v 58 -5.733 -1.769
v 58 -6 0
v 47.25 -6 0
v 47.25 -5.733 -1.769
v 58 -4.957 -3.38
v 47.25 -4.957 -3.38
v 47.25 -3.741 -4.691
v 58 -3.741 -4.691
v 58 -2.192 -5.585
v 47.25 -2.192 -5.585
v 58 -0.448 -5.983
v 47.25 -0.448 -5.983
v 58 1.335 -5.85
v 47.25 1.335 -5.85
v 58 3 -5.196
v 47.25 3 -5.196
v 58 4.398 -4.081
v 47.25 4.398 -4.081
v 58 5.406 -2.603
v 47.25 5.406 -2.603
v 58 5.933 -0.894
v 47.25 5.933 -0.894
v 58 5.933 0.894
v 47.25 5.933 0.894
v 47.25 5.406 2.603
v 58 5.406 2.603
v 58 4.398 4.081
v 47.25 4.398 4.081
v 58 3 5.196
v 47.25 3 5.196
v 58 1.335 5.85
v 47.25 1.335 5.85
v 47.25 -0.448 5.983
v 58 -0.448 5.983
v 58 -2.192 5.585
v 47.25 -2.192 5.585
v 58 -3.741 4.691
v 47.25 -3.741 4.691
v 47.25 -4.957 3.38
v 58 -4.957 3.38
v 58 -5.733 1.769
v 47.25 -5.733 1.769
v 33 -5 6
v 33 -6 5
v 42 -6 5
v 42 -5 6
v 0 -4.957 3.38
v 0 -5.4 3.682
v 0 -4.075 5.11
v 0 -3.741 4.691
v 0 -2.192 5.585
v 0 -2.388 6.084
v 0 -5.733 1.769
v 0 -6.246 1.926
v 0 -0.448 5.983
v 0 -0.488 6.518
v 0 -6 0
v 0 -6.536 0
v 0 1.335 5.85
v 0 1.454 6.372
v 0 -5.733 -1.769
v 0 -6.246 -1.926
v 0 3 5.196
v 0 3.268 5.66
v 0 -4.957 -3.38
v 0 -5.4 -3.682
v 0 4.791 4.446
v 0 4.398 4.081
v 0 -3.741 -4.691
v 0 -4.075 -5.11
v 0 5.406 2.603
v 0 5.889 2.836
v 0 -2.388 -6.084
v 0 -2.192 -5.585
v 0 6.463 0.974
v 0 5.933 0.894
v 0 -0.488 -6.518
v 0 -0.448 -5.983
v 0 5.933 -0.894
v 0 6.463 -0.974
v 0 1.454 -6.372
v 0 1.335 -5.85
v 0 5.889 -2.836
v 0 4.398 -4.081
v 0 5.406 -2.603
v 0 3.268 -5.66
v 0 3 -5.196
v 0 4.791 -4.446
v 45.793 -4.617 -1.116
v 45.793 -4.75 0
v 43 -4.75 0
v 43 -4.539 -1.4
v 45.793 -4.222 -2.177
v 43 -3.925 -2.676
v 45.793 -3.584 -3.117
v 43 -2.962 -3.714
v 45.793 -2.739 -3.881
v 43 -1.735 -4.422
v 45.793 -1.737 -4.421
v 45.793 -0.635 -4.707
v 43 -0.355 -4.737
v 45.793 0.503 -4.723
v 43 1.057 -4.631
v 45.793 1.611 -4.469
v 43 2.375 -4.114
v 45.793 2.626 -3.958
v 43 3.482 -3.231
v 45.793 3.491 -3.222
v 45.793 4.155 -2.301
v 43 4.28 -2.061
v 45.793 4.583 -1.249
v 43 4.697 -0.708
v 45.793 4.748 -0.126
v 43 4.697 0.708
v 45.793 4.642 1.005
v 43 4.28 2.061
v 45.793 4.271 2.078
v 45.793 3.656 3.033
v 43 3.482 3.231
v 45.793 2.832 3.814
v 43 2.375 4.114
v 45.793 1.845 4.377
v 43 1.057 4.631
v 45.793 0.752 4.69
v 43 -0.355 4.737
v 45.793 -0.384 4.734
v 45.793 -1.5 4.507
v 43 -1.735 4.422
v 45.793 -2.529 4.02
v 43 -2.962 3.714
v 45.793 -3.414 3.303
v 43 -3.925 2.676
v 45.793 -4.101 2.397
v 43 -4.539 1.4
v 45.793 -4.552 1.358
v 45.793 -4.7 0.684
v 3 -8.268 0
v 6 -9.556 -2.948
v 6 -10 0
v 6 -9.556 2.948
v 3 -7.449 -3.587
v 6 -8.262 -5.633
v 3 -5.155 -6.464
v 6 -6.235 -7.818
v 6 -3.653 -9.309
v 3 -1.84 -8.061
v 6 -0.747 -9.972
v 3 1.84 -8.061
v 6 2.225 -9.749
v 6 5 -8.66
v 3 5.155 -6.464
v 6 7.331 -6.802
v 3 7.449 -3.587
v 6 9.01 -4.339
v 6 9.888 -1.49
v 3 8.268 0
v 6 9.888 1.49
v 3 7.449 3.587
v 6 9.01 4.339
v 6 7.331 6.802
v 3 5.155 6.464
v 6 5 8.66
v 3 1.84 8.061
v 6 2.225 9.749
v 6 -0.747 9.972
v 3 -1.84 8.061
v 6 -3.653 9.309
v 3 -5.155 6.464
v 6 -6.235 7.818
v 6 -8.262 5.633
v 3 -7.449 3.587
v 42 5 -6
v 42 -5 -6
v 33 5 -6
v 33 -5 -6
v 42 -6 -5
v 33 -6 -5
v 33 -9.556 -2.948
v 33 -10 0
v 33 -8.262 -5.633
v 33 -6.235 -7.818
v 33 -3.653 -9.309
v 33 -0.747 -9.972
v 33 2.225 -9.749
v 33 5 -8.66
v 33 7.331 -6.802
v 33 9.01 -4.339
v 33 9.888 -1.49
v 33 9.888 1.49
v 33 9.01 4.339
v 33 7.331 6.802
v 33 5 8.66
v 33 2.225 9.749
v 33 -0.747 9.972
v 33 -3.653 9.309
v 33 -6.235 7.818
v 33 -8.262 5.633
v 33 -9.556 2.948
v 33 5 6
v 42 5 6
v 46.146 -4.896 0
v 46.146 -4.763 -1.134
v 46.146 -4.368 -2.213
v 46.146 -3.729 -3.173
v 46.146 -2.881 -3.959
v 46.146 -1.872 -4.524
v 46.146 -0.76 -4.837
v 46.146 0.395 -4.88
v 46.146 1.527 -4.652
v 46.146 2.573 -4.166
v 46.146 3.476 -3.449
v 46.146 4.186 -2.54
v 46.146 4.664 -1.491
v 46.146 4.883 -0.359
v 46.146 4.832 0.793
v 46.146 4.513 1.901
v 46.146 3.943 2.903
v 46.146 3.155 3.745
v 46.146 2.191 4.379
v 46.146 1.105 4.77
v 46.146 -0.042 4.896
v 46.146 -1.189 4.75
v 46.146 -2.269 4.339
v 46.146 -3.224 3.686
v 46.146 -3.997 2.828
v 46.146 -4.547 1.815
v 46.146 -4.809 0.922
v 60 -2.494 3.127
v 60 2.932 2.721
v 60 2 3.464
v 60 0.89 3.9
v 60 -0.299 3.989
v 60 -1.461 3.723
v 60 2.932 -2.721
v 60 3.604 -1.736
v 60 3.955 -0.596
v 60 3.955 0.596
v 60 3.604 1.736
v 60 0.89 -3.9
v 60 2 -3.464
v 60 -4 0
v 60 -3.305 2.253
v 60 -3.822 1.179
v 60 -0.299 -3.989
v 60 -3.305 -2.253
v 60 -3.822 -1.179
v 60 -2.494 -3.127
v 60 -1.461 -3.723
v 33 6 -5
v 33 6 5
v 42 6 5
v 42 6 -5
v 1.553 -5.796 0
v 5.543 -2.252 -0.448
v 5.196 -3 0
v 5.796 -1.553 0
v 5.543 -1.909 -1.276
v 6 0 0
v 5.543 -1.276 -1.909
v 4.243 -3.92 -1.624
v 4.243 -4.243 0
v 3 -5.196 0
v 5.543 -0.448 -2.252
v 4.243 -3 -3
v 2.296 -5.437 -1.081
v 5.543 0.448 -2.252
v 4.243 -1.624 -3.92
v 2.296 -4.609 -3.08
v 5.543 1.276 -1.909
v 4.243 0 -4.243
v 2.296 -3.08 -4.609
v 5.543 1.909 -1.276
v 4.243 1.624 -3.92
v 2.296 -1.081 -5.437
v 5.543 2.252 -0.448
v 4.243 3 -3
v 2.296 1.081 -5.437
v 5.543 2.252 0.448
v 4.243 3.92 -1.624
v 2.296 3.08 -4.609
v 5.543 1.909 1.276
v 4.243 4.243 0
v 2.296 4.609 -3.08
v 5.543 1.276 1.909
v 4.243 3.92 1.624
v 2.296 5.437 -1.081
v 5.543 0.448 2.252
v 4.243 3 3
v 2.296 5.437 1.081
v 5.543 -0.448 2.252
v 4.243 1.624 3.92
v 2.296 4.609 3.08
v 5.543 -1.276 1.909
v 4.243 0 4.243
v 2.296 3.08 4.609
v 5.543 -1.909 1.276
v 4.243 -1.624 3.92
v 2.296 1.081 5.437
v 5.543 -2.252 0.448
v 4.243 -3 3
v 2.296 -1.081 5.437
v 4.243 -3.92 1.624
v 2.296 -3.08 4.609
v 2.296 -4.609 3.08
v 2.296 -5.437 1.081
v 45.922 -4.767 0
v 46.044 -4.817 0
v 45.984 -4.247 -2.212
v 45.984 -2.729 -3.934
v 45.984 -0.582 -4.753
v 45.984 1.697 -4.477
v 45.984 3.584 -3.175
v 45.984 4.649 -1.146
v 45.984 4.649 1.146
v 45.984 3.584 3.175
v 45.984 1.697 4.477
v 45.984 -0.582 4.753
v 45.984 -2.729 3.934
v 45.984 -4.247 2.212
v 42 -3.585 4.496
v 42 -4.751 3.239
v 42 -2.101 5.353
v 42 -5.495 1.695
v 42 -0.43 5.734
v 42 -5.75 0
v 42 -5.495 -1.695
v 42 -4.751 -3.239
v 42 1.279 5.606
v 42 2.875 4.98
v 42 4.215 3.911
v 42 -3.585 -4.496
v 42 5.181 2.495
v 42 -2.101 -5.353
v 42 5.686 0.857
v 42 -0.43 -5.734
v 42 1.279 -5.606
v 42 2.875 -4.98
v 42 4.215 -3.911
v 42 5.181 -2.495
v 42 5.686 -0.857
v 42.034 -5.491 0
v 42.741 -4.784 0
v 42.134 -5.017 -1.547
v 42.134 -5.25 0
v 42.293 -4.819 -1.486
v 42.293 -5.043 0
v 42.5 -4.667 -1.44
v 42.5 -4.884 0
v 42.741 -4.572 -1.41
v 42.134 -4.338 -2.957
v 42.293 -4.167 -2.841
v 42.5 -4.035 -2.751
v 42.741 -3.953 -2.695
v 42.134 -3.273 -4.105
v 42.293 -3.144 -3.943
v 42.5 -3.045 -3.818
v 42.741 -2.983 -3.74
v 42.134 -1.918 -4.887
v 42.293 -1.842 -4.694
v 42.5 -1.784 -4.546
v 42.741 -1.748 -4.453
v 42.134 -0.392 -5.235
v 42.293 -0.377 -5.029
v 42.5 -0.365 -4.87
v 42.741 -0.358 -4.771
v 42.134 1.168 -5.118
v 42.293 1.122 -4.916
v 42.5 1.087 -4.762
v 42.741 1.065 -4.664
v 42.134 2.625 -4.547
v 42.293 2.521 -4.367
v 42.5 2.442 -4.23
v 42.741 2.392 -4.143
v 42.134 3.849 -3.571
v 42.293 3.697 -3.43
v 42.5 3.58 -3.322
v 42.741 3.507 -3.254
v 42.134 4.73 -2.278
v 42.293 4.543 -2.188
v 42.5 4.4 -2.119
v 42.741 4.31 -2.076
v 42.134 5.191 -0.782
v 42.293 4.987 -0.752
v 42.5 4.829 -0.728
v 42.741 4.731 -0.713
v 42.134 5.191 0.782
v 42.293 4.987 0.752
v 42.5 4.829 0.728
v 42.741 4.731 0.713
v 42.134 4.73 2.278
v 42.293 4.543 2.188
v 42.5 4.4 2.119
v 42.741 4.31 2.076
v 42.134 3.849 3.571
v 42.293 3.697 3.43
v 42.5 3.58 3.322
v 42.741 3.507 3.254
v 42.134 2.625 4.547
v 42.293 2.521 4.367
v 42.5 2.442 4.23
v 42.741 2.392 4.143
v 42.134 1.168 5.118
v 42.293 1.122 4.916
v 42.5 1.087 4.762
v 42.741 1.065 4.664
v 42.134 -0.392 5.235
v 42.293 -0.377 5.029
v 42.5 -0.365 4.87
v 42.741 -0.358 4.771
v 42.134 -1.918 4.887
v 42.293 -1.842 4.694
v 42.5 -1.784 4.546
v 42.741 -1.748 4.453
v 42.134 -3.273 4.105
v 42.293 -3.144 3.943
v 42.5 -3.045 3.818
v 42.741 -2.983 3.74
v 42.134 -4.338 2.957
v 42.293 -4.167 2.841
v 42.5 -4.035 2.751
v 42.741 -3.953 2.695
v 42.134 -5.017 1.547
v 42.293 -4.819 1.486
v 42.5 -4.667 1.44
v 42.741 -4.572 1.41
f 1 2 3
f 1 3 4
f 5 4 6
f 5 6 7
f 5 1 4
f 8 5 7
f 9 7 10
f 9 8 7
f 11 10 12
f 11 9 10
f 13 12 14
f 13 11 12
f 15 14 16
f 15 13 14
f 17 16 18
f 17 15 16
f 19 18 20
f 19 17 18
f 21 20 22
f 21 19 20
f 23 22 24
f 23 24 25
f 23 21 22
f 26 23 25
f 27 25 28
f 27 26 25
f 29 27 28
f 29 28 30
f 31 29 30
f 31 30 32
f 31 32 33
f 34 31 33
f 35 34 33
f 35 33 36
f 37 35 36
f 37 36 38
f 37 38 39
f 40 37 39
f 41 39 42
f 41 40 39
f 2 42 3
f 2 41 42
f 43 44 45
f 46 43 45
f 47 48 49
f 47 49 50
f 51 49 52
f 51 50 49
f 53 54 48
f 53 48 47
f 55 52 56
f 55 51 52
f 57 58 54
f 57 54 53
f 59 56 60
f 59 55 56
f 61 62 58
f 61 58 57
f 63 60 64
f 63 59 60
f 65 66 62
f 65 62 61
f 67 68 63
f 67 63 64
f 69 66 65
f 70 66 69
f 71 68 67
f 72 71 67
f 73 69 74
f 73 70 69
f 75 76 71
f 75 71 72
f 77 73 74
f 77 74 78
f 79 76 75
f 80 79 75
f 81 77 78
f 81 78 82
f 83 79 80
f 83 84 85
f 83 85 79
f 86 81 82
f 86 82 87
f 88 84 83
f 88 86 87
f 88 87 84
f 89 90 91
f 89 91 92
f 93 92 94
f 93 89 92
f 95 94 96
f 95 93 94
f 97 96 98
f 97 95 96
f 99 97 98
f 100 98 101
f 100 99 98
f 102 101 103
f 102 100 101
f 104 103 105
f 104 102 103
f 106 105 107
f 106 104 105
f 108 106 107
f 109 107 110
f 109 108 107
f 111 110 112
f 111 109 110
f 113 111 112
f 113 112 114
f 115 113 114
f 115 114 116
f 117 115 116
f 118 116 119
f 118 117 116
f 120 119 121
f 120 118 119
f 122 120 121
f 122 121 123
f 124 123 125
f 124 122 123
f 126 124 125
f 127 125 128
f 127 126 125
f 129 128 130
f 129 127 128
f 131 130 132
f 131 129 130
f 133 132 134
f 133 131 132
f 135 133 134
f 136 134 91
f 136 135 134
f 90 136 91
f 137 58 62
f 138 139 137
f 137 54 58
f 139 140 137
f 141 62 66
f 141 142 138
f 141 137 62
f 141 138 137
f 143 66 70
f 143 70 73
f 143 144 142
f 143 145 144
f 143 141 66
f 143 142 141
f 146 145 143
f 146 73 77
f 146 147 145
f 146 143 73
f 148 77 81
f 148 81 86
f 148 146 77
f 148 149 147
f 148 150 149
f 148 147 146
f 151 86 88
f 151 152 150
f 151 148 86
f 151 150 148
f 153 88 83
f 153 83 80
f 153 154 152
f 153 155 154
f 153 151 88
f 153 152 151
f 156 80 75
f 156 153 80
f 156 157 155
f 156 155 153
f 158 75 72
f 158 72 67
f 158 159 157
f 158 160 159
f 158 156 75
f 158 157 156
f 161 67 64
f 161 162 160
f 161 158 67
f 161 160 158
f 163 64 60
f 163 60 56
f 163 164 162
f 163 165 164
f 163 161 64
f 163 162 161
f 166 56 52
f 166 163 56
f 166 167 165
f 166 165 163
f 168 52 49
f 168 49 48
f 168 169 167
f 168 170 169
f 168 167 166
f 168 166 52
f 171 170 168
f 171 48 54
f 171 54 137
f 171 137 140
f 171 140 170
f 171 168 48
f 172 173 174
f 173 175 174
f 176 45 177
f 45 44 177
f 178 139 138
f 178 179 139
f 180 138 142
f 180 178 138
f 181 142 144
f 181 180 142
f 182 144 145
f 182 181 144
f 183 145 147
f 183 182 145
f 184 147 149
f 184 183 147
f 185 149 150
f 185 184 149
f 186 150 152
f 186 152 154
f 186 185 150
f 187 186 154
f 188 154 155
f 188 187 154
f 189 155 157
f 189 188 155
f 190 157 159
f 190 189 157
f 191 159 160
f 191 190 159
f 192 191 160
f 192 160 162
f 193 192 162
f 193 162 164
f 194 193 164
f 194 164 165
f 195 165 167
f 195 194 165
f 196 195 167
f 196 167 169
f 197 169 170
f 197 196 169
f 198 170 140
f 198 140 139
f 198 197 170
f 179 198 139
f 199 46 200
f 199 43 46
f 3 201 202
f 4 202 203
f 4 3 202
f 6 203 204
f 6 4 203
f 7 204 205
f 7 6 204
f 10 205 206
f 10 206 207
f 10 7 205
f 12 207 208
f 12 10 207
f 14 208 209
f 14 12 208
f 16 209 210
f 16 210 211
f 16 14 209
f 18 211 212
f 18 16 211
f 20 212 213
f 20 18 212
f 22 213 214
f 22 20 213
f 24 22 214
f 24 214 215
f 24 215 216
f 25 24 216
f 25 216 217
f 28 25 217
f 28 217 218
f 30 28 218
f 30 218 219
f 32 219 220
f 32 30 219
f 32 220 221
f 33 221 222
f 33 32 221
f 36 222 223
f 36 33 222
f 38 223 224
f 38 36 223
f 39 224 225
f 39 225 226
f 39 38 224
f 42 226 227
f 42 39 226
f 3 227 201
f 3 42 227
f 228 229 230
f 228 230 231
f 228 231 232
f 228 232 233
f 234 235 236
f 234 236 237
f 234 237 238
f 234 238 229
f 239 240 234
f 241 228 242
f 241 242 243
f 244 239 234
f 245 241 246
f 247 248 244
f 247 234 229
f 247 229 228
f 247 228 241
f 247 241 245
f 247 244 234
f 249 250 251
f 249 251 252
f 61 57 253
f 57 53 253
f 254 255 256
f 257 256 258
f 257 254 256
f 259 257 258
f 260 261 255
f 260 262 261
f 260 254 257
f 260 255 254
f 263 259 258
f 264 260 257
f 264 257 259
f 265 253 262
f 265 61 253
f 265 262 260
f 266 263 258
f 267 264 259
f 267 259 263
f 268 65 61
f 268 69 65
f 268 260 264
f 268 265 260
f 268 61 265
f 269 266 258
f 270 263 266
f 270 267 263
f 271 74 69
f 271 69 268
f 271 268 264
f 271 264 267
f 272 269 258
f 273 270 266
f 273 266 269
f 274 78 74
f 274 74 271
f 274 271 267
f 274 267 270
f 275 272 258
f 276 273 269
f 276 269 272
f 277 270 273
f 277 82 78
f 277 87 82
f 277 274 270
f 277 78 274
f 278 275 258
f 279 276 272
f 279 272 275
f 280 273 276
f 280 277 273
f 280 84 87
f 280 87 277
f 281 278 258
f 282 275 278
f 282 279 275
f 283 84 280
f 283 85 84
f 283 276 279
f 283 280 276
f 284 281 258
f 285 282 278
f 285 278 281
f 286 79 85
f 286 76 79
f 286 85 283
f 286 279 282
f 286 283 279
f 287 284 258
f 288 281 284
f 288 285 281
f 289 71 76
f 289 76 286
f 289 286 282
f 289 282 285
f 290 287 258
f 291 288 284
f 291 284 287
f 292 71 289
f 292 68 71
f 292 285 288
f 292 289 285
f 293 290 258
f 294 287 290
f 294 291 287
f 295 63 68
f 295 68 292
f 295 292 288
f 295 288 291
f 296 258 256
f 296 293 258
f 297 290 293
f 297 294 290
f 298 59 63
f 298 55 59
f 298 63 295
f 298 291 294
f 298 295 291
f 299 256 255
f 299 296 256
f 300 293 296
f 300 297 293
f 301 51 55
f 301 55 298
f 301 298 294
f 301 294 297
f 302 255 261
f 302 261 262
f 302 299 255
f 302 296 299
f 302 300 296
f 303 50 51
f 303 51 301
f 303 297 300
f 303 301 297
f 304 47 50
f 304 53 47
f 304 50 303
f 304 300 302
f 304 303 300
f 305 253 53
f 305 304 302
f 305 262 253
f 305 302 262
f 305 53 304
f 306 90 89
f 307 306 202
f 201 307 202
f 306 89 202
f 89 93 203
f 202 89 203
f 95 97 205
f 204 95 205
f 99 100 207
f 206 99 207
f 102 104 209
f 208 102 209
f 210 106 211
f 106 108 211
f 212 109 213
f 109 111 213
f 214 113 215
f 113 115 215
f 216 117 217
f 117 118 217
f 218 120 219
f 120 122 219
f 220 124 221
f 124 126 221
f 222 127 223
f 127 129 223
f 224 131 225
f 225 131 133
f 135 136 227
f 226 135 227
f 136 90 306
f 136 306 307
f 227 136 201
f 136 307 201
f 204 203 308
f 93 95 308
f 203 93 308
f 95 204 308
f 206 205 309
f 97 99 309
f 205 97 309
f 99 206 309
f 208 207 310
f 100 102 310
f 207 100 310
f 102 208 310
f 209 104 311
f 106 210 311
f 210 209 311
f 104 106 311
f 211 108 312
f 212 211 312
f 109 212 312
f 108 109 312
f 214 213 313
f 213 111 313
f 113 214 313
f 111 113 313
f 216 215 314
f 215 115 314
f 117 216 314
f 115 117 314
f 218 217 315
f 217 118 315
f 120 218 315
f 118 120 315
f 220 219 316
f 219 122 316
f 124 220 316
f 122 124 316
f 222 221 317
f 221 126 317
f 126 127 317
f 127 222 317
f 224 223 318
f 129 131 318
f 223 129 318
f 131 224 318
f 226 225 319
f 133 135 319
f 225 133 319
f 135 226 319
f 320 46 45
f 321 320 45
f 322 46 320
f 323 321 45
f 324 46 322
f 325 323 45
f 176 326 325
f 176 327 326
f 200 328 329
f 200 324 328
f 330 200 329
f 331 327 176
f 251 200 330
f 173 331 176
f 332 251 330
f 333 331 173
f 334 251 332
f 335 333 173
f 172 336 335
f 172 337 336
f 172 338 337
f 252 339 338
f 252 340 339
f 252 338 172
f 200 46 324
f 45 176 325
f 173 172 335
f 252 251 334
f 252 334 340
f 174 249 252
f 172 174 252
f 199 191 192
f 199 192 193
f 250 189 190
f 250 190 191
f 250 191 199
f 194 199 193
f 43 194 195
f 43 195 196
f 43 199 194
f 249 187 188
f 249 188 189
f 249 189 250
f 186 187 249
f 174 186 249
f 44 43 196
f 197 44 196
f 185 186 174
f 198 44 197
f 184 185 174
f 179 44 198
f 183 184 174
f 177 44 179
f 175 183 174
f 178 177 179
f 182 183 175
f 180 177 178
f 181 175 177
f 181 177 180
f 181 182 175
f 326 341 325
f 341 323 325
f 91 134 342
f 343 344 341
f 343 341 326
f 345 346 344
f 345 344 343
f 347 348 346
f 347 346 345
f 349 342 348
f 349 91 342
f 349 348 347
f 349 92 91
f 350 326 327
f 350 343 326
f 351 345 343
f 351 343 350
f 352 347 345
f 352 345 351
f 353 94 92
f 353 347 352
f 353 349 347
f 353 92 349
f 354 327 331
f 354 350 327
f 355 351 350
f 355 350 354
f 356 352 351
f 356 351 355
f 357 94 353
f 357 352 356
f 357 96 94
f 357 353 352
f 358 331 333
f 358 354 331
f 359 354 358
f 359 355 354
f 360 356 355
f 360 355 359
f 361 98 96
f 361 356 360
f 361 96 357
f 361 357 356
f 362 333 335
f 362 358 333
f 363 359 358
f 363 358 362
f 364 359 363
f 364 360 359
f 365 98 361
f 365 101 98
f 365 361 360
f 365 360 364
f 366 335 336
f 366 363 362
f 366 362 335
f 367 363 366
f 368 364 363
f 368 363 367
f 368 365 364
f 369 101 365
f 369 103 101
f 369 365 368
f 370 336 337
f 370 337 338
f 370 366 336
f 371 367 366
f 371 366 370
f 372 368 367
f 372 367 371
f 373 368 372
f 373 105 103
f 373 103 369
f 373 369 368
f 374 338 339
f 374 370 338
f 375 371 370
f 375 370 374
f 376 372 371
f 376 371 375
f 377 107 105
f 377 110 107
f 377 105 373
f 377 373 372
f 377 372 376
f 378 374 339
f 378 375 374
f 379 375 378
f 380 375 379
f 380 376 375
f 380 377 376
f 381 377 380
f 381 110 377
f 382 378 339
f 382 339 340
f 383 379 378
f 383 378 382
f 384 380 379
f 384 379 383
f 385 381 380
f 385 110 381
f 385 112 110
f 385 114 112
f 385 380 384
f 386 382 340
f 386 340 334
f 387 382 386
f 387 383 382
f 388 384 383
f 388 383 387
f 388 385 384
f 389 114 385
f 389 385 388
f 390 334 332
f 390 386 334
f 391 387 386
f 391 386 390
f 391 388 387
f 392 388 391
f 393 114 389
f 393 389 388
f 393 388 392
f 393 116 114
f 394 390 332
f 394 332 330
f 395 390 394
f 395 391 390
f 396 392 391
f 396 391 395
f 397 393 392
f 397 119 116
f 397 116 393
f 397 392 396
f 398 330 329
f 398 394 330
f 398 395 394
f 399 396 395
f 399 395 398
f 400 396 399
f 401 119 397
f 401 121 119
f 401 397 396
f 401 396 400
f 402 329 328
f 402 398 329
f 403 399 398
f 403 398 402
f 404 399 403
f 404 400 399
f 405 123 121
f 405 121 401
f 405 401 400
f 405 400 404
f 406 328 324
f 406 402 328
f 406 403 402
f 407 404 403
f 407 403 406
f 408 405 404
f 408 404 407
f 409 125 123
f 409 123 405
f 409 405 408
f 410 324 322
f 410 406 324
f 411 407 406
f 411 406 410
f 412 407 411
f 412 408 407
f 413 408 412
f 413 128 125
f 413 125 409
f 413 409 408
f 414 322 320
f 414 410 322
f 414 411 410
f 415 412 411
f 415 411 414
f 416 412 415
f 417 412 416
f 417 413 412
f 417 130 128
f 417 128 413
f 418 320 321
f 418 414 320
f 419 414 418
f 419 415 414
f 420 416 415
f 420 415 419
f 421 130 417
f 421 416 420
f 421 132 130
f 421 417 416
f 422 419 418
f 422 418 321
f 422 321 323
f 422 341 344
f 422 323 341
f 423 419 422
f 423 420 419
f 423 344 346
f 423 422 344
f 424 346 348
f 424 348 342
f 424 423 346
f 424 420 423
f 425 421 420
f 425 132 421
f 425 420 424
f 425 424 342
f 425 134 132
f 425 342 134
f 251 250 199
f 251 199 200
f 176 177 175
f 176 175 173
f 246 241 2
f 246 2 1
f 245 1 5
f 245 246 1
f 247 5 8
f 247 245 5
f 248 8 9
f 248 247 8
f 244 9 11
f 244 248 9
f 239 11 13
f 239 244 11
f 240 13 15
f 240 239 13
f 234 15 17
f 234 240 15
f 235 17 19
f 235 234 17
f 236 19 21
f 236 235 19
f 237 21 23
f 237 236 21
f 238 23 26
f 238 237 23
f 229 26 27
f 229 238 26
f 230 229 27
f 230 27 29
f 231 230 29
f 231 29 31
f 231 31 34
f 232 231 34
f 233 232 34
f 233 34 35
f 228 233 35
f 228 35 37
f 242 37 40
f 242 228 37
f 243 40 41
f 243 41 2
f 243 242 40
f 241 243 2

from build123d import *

# Parameters (mm, degrees)
SKETCH_2_W      = 12
SKETCH_2_H      = 12
EXTRUDE_1_DEPTH = 9
CHAMFER_1_SIZE  = 1
FILLET_1_R      = 1
FILLET_2_R      = 0.5
CHAMFER_2_SIZE  = 2


with BuildPart() as part:
    # Эскиз1 → Повернуть1 (revolve)
    with BuildSketch(Plane.XY, mode=Mode.PRIVATE) as revolve_1_sk:
        with BuildLine():
            Line((0, 6), (0, 6.535898385))
            Line((0, 6.535898385), (6, 10))
            Line((6, 10), (33, 10))
            Line((33, 10), (33, 6))
            Line((33, 6), (42, 6))
            Line((42, 6), (42, 4.75))
            Line((42, 4.75), (46, 4.75))
            Line((46, 4.75), (47.25, 6))
            Line((47.25, 6), (60, 6))
            Line((60, 6), (60, 0))
            Line((60, 0), (6, 0))
            ThreePointArc((6, 0), (4.242640687, 4.242640687), (0, 6))
        make_face()
    revolve(revolve_1_sk.sketch.rotate(Axis((0, 0, 0), (1, 0, 0)), 180), axis=Axis((0, 0, 0), (1, 0, 0)))

    # Эскиз2 → Бобышка-Вытянуть1 (add)
    with BuildSketch(Plane(origin=(33, 0, 0), x_dir=(0, 0, -1), z_dir=(1, 0, 0))):
        Rectangle(SKETCH_2_W, SKETCH_2_H)
    extrude(amount=EXTRUDE_1_DEPTH)

    # Фаска1
    chamfer_1_edges = [part.edges().sort_by_distance(p)[0] for p in [
        (37.5, -6, 6),
        (37.5, 6, 6),
        (37.5, 6, -6),
        (37.5, -6, -6),
    ]]
    chamfer(chamfer_1_edges, length=CHAMFER_1_SIZE)

    # Скругление1
    fillet_1_edges = [part.edges().sort_by_distance(p)[0] for p in [
        (42, 4.75, 0),
    ]]
    fillet(fillet_1_edges, radius=FILLET_1_R)

    # Скругление2
    fillet_2_edges = [part.edges().sort_by_distance(p)[0] for p in [
        (46, 4.75, 0),
    ]]
    fillet(fillet_2_edges, radius=FILLET_2_R)

    # Фаска2
    chamfer_2_edges = [part.edges().sort_by_distance(p)[0] for p in [
        (60, 6, 0),
    ]]
    chamfer(chamfer_2_edges, length=CHAMFER_2_SIZE)


solid = part.part
